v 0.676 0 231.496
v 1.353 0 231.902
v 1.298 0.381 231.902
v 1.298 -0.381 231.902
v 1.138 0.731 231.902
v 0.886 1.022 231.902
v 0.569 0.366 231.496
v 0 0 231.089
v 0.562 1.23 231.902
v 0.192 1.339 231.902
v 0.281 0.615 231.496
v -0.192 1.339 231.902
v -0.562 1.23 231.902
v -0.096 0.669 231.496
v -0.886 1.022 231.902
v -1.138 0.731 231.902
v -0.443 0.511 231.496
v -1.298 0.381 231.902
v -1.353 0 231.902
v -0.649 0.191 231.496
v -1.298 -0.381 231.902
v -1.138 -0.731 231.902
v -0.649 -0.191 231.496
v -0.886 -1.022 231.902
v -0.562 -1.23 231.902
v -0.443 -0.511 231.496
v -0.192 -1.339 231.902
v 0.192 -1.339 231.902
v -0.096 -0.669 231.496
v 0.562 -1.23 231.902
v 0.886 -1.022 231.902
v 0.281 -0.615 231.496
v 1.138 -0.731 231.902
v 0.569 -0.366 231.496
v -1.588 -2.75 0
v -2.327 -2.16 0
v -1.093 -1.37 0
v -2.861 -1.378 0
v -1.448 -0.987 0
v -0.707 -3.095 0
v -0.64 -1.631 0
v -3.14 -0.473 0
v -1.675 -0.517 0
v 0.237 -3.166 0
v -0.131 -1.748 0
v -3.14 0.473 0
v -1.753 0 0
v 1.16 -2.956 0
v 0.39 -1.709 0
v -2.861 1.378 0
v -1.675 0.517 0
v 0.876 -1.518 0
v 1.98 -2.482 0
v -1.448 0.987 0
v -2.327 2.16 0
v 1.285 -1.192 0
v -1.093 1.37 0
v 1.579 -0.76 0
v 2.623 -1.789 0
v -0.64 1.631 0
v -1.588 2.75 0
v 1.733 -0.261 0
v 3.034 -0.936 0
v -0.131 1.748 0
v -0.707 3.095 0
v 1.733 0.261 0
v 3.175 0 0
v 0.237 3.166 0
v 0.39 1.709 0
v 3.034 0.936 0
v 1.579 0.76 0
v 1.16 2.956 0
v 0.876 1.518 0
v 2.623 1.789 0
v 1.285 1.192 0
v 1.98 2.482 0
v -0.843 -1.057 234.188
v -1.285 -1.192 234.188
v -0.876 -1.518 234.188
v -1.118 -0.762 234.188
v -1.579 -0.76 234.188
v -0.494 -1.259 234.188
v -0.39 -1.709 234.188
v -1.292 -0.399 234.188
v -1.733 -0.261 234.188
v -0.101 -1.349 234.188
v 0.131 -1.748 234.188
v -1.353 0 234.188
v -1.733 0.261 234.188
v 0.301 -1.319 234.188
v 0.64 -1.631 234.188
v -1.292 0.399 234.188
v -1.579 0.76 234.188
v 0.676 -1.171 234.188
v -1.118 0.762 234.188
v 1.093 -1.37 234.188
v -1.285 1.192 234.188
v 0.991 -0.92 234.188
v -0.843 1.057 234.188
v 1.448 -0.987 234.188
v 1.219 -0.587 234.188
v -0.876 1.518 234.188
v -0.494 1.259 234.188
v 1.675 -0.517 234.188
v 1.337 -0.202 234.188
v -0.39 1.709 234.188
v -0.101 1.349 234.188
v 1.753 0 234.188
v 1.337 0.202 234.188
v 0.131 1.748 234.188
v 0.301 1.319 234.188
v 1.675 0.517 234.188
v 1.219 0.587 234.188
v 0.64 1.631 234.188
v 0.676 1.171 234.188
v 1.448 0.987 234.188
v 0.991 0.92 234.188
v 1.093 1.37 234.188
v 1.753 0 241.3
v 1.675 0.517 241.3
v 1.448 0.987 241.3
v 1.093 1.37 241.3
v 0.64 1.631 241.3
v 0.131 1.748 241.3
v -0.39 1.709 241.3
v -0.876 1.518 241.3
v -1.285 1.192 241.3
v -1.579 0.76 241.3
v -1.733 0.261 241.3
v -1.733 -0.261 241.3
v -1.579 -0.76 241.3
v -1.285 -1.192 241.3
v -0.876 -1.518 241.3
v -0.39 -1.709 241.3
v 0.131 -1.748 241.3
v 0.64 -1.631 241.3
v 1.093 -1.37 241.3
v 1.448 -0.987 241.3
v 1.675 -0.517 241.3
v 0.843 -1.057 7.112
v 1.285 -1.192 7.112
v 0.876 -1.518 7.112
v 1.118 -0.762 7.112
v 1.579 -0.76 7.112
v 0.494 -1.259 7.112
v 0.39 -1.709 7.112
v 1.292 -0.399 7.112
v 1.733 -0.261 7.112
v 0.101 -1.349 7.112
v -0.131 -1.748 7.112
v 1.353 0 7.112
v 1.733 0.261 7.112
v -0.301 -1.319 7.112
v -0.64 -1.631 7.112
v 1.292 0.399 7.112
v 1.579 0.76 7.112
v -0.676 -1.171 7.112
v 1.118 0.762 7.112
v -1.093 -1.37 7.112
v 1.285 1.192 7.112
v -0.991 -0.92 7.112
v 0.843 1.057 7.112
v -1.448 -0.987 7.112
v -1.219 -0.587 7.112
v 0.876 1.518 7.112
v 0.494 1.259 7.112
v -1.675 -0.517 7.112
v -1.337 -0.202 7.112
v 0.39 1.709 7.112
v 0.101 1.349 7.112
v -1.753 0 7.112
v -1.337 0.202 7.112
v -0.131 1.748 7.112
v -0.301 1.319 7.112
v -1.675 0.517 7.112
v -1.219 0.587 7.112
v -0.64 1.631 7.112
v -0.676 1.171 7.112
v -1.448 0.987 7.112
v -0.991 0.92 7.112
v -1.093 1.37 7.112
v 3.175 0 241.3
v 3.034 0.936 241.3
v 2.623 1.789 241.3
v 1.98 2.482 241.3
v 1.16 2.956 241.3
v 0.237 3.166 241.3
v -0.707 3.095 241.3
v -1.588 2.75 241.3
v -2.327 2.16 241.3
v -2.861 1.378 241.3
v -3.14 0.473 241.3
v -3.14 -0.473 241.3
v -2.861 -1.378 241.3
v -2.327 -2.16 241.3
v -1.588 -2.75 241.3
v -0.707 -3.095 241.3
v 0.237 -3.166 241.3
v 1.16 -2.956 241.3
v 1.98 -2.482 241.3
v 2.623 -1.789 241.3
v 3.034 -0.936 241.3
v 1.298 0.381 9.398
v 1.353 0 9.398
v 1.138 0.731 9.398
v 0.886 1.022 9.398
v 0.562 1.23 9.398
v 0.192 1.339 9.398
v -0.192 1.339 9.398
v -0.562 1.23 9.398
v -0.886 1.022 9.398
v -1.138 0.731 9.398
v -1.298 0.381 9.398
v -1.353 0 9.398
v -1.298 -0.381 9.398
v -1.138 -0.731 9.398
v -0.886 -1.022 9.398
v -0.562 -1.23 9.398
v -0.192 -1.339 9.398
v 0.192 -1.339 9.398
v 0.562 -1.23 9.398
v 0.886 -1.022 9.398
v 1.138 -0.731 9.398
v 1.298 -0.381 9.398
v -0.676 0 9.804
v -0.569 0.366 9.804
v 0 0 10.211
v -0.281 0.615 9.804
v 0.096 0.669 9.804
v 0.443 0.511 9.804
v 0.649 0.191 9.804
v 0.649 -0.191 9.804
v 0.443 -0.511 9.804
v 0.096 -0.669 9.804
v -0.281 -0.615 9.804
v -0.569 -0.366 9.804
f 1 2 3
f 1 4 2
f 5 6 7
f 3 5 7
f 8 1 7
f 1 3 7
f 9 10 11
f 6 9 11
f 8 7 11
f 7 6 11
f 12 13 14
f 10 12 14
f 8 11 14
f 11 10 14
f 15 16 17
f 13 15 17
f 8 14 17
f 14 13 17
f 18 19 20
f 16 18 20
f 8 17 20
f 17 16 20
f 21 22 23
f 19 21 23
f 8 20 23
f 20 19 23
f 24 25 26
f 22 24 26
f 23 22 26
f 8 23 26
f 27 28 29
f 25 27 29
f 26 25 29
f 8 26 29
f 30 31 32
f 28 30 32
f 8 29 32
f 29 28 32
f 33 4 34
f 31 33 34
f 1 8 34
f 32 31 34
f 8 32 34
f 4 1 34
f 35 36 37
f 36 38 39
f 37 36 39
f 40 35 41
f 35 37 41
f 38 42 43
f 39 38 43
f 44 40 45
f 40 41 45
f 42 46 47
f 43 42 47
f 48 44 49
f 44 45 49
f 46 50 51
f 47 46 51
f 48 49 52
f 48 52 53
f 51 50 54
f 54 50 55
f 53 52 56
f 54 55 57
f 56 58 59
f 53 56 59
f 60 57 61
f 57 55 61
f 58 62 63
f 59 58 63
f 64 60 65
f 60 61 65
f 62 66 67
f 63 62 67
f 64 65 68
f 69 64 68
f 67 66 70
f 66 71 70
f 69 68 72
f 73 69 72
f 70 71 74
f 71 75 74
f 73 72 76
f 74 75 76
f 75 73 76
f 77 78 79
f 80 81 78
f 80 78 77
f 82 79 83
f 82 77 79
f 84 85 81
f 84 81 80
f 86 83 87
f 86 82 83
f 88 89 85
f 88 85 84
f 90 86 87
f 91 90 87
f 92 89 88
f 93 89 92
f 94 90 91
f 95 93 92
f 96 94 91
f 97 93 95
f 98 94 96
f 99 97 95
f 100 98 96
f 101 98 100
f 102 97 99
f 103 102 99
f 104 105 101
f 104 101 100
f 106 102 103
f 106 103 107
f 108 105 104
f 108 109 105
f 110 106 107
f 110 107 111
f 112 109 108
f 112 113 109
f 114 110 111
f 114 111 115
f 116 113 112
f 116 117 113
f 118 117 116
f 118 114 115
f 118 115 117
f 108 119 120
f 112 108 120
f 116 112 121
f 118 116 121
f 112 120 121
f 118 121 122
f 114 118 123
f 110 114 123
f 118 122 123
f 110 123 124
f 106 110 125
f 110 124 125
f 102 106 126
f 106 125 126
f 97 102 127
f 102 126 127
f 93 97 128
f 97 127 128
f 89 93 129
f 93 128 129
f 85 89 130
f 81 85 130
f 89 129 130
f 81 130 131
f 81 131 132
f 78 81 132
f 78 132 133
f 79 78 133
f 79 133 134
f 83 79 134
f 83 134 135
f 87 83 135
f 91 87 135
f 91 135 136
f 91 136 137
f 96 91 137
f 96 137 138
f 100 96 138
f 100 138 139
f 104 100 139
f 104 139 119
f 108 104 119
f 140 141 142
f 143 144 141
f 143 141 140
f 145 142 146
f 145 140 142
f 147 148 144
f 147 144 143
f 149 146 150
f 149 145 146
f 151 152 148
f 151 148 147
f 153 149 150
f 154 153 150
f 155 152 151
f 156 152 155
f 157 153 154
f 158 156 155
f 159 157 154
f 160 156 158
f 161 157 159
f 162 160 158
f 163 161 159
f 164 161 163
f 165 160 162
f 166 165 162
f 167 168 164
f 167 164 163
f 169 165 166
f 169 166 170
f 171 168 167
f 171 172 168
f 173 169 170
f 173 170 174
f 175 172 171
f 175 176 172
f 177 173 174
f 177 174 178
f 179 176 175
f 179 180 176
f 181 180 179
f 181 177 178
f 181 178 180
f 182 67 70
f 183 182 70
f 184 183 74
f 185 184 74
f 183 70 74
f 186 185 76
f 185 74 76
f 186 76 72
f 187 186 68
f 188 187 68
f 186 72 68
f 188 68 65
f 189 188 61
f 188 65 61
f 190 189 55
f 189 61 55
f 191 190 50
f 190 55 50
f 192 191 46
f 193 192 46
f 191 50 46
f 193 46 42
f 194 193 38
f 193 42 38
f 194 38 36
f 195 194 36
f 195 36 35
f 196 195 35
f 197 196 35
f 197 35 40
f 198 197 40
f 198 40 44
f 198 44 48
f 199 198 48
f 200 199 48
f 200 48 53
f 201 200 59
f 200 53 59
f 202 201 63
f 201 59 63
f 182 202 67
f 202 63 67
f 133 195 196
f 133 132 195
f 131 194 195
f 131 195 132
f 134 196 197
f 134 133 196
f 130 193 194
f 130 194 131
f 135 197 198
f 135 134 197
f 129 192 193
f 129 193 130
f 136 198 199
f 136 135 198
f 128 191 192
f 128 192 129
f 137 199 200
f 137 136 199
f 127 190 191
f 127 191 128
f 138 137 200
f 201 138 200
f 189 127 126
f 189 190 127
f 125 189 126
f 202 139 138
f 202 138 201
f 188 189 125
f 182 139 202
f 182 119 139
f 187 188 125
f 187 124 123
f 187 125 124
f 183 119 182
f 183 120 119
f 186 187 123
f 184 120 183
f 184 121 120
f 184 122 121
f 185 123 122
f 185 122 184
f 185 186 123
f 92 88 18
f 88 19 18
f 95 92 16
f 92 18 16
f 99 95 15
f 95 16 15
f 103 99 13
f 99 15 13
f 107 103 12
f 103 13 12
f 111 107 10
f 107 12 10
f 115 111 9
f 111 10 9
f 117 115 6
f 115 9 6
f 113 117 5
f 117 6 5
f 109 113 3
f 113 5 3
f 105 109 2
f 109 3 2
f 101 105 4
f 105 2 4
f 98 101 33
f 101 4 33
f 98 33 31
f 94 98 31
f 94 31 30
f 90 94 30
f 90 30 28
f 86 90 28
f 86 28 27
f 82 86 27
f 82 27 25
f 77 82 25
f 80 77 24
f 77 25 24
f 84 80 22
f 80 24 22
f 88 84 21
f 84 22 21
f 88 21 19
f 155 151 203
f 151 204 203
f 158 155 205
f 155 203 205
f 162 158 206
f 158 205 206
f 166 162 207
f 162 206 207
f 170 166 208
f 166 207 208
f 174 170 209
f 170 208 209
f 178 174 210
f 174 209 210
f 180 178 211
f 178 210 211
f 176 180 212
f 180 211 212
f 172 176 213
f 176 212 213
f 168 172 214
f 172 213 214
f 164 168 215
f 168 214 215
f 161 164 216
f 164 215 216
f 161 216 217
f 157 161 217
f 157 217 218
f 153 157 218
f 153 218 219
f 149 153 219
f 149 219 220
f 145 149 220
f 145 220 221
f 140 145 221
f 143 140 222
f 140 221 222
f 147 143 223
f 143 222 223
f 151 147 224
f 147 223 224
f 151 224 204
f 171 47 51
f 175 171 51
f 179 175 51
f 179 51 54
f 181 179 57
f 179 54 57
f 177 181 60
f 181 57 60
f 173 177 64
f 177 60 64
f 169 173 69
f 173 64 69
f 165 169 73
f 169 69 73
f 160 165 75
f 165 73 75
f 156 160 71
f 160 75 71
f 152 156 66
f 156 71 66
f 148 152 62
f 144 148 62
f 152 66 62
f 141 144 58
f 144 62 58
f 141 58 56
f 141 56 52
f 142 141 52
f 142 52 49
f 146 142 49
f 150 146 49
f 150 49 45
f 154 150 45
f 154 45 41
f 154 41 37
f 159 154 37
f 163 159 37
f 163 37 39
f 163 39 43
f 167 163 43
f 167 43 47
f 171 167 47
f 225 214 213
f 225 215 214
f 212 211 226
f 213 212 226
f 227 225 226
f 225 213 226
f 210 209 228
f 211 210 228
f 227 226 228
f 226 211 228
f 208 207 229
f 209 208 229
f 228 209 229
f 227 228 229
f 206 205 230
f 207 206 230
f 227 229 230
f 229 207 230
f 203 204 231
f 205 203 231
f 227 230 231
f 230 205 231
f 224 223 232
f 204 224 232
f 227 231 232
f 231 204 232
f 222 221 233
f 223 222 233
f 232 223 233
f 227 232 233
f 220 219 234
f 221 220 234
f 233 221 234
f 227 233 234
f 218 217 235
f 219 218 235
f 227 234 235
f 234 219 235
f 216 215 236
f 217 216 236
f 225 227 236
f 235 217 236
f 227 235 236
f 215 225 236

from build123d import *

# Parameters (mm, degrees)
SKETCH1_R                       = 3.175
BOSS_EXTRUDE1_DEPTH             = 241.3
F_6_32_TAPPED_HOLE1_D           = 2.7051
F_6_32_TAPPED_HOLE1_DEPTH       = 9.398
F_6_32_TAPPED_HOLE1_CBORE_D     = 3.5052
F_6_32_TAPPED_HOLE1_CBORE_DEPTH = 7.112
F_6_32_TAPPED_HOLE1_TIP         = 0.81269403
F_6_32_TAPPED_HOLE2_D           = 2.7051
F_6_32_TAPPED_HOLE2_DEPTH       = 9.398
F_6_32_TAPPED_HOLE2_CBORE_D     = 3.5052
F_6_32_TAPPED_HOLE2_CBORE_DEPTH = 7.112
F_6_32_TAPPED_HOLE2_TIP         = 0.81269403


with BuildPart() as part:
    # Sketch1 → Boss-Extrude1 (new body)
    with BuildSketch(Plane.XY):
        Circle(SKETCH1_R)
    extrude(amount=BOSS_EXTRUDE1_DEPTH)

    # #6-32 Tapped Hole1
    with Locations(Plane.XY.offset(241.3)):
        with Locations((0, 0)):
            CounterBoreHole(F_6_32_TAPPED_HOLE1_D / 2, F_6_32_TAPPED_HOLE1_CBORE_D / 2, F_6_32_TAPPED_HOLE1_CBORE_DEPTH, depth=F_6_32_TAPPED_HOLE1_DEPTH)
            with Locations((0, 0, -(F_6_32_TAPPED_HOLE1_DEPTH + F_6_32_TAPPED_HOLE1_TIP / 2))):  # 118° drill point
                Cone(0, F_6_32_TAPPED_HOLE1_D / 2, F_6_32_TAPPED_HOLE1_TIP, mode=Mode.SUBTRACT)

    # #6-32 Tapped Hole2
    with Locations(Plane(origin=(0, 0, 0), x_dir=(-1, 0, 0), z_dir=(0, 0, -1))):
        with Locations((0, 0)):
            CounterBoreHole(F_6_32_TAPPED_HOLE2_D / 2, F_6_32_TAPPED_HOLE2_CBORE_D / 2, F_6_32_TAPPED_HOLE2_CBORE_DEPTH, depth=F_6_32_TAPPED_HOLE2_DEPTH)
            with Locations((0, 0, -(F_6_32_TAPPED_HOLE2_DEPTH + F_6_32_TAPPED_HOLE2_TIP / 2))):  # 118° drill point
                Cone(0, F_6_32_TAPPED_HOLE2_D / 2, F_6_32_TAPPED_HOLE2_TIP, mode=Mode.SUBTRACT)


solid = part.part
